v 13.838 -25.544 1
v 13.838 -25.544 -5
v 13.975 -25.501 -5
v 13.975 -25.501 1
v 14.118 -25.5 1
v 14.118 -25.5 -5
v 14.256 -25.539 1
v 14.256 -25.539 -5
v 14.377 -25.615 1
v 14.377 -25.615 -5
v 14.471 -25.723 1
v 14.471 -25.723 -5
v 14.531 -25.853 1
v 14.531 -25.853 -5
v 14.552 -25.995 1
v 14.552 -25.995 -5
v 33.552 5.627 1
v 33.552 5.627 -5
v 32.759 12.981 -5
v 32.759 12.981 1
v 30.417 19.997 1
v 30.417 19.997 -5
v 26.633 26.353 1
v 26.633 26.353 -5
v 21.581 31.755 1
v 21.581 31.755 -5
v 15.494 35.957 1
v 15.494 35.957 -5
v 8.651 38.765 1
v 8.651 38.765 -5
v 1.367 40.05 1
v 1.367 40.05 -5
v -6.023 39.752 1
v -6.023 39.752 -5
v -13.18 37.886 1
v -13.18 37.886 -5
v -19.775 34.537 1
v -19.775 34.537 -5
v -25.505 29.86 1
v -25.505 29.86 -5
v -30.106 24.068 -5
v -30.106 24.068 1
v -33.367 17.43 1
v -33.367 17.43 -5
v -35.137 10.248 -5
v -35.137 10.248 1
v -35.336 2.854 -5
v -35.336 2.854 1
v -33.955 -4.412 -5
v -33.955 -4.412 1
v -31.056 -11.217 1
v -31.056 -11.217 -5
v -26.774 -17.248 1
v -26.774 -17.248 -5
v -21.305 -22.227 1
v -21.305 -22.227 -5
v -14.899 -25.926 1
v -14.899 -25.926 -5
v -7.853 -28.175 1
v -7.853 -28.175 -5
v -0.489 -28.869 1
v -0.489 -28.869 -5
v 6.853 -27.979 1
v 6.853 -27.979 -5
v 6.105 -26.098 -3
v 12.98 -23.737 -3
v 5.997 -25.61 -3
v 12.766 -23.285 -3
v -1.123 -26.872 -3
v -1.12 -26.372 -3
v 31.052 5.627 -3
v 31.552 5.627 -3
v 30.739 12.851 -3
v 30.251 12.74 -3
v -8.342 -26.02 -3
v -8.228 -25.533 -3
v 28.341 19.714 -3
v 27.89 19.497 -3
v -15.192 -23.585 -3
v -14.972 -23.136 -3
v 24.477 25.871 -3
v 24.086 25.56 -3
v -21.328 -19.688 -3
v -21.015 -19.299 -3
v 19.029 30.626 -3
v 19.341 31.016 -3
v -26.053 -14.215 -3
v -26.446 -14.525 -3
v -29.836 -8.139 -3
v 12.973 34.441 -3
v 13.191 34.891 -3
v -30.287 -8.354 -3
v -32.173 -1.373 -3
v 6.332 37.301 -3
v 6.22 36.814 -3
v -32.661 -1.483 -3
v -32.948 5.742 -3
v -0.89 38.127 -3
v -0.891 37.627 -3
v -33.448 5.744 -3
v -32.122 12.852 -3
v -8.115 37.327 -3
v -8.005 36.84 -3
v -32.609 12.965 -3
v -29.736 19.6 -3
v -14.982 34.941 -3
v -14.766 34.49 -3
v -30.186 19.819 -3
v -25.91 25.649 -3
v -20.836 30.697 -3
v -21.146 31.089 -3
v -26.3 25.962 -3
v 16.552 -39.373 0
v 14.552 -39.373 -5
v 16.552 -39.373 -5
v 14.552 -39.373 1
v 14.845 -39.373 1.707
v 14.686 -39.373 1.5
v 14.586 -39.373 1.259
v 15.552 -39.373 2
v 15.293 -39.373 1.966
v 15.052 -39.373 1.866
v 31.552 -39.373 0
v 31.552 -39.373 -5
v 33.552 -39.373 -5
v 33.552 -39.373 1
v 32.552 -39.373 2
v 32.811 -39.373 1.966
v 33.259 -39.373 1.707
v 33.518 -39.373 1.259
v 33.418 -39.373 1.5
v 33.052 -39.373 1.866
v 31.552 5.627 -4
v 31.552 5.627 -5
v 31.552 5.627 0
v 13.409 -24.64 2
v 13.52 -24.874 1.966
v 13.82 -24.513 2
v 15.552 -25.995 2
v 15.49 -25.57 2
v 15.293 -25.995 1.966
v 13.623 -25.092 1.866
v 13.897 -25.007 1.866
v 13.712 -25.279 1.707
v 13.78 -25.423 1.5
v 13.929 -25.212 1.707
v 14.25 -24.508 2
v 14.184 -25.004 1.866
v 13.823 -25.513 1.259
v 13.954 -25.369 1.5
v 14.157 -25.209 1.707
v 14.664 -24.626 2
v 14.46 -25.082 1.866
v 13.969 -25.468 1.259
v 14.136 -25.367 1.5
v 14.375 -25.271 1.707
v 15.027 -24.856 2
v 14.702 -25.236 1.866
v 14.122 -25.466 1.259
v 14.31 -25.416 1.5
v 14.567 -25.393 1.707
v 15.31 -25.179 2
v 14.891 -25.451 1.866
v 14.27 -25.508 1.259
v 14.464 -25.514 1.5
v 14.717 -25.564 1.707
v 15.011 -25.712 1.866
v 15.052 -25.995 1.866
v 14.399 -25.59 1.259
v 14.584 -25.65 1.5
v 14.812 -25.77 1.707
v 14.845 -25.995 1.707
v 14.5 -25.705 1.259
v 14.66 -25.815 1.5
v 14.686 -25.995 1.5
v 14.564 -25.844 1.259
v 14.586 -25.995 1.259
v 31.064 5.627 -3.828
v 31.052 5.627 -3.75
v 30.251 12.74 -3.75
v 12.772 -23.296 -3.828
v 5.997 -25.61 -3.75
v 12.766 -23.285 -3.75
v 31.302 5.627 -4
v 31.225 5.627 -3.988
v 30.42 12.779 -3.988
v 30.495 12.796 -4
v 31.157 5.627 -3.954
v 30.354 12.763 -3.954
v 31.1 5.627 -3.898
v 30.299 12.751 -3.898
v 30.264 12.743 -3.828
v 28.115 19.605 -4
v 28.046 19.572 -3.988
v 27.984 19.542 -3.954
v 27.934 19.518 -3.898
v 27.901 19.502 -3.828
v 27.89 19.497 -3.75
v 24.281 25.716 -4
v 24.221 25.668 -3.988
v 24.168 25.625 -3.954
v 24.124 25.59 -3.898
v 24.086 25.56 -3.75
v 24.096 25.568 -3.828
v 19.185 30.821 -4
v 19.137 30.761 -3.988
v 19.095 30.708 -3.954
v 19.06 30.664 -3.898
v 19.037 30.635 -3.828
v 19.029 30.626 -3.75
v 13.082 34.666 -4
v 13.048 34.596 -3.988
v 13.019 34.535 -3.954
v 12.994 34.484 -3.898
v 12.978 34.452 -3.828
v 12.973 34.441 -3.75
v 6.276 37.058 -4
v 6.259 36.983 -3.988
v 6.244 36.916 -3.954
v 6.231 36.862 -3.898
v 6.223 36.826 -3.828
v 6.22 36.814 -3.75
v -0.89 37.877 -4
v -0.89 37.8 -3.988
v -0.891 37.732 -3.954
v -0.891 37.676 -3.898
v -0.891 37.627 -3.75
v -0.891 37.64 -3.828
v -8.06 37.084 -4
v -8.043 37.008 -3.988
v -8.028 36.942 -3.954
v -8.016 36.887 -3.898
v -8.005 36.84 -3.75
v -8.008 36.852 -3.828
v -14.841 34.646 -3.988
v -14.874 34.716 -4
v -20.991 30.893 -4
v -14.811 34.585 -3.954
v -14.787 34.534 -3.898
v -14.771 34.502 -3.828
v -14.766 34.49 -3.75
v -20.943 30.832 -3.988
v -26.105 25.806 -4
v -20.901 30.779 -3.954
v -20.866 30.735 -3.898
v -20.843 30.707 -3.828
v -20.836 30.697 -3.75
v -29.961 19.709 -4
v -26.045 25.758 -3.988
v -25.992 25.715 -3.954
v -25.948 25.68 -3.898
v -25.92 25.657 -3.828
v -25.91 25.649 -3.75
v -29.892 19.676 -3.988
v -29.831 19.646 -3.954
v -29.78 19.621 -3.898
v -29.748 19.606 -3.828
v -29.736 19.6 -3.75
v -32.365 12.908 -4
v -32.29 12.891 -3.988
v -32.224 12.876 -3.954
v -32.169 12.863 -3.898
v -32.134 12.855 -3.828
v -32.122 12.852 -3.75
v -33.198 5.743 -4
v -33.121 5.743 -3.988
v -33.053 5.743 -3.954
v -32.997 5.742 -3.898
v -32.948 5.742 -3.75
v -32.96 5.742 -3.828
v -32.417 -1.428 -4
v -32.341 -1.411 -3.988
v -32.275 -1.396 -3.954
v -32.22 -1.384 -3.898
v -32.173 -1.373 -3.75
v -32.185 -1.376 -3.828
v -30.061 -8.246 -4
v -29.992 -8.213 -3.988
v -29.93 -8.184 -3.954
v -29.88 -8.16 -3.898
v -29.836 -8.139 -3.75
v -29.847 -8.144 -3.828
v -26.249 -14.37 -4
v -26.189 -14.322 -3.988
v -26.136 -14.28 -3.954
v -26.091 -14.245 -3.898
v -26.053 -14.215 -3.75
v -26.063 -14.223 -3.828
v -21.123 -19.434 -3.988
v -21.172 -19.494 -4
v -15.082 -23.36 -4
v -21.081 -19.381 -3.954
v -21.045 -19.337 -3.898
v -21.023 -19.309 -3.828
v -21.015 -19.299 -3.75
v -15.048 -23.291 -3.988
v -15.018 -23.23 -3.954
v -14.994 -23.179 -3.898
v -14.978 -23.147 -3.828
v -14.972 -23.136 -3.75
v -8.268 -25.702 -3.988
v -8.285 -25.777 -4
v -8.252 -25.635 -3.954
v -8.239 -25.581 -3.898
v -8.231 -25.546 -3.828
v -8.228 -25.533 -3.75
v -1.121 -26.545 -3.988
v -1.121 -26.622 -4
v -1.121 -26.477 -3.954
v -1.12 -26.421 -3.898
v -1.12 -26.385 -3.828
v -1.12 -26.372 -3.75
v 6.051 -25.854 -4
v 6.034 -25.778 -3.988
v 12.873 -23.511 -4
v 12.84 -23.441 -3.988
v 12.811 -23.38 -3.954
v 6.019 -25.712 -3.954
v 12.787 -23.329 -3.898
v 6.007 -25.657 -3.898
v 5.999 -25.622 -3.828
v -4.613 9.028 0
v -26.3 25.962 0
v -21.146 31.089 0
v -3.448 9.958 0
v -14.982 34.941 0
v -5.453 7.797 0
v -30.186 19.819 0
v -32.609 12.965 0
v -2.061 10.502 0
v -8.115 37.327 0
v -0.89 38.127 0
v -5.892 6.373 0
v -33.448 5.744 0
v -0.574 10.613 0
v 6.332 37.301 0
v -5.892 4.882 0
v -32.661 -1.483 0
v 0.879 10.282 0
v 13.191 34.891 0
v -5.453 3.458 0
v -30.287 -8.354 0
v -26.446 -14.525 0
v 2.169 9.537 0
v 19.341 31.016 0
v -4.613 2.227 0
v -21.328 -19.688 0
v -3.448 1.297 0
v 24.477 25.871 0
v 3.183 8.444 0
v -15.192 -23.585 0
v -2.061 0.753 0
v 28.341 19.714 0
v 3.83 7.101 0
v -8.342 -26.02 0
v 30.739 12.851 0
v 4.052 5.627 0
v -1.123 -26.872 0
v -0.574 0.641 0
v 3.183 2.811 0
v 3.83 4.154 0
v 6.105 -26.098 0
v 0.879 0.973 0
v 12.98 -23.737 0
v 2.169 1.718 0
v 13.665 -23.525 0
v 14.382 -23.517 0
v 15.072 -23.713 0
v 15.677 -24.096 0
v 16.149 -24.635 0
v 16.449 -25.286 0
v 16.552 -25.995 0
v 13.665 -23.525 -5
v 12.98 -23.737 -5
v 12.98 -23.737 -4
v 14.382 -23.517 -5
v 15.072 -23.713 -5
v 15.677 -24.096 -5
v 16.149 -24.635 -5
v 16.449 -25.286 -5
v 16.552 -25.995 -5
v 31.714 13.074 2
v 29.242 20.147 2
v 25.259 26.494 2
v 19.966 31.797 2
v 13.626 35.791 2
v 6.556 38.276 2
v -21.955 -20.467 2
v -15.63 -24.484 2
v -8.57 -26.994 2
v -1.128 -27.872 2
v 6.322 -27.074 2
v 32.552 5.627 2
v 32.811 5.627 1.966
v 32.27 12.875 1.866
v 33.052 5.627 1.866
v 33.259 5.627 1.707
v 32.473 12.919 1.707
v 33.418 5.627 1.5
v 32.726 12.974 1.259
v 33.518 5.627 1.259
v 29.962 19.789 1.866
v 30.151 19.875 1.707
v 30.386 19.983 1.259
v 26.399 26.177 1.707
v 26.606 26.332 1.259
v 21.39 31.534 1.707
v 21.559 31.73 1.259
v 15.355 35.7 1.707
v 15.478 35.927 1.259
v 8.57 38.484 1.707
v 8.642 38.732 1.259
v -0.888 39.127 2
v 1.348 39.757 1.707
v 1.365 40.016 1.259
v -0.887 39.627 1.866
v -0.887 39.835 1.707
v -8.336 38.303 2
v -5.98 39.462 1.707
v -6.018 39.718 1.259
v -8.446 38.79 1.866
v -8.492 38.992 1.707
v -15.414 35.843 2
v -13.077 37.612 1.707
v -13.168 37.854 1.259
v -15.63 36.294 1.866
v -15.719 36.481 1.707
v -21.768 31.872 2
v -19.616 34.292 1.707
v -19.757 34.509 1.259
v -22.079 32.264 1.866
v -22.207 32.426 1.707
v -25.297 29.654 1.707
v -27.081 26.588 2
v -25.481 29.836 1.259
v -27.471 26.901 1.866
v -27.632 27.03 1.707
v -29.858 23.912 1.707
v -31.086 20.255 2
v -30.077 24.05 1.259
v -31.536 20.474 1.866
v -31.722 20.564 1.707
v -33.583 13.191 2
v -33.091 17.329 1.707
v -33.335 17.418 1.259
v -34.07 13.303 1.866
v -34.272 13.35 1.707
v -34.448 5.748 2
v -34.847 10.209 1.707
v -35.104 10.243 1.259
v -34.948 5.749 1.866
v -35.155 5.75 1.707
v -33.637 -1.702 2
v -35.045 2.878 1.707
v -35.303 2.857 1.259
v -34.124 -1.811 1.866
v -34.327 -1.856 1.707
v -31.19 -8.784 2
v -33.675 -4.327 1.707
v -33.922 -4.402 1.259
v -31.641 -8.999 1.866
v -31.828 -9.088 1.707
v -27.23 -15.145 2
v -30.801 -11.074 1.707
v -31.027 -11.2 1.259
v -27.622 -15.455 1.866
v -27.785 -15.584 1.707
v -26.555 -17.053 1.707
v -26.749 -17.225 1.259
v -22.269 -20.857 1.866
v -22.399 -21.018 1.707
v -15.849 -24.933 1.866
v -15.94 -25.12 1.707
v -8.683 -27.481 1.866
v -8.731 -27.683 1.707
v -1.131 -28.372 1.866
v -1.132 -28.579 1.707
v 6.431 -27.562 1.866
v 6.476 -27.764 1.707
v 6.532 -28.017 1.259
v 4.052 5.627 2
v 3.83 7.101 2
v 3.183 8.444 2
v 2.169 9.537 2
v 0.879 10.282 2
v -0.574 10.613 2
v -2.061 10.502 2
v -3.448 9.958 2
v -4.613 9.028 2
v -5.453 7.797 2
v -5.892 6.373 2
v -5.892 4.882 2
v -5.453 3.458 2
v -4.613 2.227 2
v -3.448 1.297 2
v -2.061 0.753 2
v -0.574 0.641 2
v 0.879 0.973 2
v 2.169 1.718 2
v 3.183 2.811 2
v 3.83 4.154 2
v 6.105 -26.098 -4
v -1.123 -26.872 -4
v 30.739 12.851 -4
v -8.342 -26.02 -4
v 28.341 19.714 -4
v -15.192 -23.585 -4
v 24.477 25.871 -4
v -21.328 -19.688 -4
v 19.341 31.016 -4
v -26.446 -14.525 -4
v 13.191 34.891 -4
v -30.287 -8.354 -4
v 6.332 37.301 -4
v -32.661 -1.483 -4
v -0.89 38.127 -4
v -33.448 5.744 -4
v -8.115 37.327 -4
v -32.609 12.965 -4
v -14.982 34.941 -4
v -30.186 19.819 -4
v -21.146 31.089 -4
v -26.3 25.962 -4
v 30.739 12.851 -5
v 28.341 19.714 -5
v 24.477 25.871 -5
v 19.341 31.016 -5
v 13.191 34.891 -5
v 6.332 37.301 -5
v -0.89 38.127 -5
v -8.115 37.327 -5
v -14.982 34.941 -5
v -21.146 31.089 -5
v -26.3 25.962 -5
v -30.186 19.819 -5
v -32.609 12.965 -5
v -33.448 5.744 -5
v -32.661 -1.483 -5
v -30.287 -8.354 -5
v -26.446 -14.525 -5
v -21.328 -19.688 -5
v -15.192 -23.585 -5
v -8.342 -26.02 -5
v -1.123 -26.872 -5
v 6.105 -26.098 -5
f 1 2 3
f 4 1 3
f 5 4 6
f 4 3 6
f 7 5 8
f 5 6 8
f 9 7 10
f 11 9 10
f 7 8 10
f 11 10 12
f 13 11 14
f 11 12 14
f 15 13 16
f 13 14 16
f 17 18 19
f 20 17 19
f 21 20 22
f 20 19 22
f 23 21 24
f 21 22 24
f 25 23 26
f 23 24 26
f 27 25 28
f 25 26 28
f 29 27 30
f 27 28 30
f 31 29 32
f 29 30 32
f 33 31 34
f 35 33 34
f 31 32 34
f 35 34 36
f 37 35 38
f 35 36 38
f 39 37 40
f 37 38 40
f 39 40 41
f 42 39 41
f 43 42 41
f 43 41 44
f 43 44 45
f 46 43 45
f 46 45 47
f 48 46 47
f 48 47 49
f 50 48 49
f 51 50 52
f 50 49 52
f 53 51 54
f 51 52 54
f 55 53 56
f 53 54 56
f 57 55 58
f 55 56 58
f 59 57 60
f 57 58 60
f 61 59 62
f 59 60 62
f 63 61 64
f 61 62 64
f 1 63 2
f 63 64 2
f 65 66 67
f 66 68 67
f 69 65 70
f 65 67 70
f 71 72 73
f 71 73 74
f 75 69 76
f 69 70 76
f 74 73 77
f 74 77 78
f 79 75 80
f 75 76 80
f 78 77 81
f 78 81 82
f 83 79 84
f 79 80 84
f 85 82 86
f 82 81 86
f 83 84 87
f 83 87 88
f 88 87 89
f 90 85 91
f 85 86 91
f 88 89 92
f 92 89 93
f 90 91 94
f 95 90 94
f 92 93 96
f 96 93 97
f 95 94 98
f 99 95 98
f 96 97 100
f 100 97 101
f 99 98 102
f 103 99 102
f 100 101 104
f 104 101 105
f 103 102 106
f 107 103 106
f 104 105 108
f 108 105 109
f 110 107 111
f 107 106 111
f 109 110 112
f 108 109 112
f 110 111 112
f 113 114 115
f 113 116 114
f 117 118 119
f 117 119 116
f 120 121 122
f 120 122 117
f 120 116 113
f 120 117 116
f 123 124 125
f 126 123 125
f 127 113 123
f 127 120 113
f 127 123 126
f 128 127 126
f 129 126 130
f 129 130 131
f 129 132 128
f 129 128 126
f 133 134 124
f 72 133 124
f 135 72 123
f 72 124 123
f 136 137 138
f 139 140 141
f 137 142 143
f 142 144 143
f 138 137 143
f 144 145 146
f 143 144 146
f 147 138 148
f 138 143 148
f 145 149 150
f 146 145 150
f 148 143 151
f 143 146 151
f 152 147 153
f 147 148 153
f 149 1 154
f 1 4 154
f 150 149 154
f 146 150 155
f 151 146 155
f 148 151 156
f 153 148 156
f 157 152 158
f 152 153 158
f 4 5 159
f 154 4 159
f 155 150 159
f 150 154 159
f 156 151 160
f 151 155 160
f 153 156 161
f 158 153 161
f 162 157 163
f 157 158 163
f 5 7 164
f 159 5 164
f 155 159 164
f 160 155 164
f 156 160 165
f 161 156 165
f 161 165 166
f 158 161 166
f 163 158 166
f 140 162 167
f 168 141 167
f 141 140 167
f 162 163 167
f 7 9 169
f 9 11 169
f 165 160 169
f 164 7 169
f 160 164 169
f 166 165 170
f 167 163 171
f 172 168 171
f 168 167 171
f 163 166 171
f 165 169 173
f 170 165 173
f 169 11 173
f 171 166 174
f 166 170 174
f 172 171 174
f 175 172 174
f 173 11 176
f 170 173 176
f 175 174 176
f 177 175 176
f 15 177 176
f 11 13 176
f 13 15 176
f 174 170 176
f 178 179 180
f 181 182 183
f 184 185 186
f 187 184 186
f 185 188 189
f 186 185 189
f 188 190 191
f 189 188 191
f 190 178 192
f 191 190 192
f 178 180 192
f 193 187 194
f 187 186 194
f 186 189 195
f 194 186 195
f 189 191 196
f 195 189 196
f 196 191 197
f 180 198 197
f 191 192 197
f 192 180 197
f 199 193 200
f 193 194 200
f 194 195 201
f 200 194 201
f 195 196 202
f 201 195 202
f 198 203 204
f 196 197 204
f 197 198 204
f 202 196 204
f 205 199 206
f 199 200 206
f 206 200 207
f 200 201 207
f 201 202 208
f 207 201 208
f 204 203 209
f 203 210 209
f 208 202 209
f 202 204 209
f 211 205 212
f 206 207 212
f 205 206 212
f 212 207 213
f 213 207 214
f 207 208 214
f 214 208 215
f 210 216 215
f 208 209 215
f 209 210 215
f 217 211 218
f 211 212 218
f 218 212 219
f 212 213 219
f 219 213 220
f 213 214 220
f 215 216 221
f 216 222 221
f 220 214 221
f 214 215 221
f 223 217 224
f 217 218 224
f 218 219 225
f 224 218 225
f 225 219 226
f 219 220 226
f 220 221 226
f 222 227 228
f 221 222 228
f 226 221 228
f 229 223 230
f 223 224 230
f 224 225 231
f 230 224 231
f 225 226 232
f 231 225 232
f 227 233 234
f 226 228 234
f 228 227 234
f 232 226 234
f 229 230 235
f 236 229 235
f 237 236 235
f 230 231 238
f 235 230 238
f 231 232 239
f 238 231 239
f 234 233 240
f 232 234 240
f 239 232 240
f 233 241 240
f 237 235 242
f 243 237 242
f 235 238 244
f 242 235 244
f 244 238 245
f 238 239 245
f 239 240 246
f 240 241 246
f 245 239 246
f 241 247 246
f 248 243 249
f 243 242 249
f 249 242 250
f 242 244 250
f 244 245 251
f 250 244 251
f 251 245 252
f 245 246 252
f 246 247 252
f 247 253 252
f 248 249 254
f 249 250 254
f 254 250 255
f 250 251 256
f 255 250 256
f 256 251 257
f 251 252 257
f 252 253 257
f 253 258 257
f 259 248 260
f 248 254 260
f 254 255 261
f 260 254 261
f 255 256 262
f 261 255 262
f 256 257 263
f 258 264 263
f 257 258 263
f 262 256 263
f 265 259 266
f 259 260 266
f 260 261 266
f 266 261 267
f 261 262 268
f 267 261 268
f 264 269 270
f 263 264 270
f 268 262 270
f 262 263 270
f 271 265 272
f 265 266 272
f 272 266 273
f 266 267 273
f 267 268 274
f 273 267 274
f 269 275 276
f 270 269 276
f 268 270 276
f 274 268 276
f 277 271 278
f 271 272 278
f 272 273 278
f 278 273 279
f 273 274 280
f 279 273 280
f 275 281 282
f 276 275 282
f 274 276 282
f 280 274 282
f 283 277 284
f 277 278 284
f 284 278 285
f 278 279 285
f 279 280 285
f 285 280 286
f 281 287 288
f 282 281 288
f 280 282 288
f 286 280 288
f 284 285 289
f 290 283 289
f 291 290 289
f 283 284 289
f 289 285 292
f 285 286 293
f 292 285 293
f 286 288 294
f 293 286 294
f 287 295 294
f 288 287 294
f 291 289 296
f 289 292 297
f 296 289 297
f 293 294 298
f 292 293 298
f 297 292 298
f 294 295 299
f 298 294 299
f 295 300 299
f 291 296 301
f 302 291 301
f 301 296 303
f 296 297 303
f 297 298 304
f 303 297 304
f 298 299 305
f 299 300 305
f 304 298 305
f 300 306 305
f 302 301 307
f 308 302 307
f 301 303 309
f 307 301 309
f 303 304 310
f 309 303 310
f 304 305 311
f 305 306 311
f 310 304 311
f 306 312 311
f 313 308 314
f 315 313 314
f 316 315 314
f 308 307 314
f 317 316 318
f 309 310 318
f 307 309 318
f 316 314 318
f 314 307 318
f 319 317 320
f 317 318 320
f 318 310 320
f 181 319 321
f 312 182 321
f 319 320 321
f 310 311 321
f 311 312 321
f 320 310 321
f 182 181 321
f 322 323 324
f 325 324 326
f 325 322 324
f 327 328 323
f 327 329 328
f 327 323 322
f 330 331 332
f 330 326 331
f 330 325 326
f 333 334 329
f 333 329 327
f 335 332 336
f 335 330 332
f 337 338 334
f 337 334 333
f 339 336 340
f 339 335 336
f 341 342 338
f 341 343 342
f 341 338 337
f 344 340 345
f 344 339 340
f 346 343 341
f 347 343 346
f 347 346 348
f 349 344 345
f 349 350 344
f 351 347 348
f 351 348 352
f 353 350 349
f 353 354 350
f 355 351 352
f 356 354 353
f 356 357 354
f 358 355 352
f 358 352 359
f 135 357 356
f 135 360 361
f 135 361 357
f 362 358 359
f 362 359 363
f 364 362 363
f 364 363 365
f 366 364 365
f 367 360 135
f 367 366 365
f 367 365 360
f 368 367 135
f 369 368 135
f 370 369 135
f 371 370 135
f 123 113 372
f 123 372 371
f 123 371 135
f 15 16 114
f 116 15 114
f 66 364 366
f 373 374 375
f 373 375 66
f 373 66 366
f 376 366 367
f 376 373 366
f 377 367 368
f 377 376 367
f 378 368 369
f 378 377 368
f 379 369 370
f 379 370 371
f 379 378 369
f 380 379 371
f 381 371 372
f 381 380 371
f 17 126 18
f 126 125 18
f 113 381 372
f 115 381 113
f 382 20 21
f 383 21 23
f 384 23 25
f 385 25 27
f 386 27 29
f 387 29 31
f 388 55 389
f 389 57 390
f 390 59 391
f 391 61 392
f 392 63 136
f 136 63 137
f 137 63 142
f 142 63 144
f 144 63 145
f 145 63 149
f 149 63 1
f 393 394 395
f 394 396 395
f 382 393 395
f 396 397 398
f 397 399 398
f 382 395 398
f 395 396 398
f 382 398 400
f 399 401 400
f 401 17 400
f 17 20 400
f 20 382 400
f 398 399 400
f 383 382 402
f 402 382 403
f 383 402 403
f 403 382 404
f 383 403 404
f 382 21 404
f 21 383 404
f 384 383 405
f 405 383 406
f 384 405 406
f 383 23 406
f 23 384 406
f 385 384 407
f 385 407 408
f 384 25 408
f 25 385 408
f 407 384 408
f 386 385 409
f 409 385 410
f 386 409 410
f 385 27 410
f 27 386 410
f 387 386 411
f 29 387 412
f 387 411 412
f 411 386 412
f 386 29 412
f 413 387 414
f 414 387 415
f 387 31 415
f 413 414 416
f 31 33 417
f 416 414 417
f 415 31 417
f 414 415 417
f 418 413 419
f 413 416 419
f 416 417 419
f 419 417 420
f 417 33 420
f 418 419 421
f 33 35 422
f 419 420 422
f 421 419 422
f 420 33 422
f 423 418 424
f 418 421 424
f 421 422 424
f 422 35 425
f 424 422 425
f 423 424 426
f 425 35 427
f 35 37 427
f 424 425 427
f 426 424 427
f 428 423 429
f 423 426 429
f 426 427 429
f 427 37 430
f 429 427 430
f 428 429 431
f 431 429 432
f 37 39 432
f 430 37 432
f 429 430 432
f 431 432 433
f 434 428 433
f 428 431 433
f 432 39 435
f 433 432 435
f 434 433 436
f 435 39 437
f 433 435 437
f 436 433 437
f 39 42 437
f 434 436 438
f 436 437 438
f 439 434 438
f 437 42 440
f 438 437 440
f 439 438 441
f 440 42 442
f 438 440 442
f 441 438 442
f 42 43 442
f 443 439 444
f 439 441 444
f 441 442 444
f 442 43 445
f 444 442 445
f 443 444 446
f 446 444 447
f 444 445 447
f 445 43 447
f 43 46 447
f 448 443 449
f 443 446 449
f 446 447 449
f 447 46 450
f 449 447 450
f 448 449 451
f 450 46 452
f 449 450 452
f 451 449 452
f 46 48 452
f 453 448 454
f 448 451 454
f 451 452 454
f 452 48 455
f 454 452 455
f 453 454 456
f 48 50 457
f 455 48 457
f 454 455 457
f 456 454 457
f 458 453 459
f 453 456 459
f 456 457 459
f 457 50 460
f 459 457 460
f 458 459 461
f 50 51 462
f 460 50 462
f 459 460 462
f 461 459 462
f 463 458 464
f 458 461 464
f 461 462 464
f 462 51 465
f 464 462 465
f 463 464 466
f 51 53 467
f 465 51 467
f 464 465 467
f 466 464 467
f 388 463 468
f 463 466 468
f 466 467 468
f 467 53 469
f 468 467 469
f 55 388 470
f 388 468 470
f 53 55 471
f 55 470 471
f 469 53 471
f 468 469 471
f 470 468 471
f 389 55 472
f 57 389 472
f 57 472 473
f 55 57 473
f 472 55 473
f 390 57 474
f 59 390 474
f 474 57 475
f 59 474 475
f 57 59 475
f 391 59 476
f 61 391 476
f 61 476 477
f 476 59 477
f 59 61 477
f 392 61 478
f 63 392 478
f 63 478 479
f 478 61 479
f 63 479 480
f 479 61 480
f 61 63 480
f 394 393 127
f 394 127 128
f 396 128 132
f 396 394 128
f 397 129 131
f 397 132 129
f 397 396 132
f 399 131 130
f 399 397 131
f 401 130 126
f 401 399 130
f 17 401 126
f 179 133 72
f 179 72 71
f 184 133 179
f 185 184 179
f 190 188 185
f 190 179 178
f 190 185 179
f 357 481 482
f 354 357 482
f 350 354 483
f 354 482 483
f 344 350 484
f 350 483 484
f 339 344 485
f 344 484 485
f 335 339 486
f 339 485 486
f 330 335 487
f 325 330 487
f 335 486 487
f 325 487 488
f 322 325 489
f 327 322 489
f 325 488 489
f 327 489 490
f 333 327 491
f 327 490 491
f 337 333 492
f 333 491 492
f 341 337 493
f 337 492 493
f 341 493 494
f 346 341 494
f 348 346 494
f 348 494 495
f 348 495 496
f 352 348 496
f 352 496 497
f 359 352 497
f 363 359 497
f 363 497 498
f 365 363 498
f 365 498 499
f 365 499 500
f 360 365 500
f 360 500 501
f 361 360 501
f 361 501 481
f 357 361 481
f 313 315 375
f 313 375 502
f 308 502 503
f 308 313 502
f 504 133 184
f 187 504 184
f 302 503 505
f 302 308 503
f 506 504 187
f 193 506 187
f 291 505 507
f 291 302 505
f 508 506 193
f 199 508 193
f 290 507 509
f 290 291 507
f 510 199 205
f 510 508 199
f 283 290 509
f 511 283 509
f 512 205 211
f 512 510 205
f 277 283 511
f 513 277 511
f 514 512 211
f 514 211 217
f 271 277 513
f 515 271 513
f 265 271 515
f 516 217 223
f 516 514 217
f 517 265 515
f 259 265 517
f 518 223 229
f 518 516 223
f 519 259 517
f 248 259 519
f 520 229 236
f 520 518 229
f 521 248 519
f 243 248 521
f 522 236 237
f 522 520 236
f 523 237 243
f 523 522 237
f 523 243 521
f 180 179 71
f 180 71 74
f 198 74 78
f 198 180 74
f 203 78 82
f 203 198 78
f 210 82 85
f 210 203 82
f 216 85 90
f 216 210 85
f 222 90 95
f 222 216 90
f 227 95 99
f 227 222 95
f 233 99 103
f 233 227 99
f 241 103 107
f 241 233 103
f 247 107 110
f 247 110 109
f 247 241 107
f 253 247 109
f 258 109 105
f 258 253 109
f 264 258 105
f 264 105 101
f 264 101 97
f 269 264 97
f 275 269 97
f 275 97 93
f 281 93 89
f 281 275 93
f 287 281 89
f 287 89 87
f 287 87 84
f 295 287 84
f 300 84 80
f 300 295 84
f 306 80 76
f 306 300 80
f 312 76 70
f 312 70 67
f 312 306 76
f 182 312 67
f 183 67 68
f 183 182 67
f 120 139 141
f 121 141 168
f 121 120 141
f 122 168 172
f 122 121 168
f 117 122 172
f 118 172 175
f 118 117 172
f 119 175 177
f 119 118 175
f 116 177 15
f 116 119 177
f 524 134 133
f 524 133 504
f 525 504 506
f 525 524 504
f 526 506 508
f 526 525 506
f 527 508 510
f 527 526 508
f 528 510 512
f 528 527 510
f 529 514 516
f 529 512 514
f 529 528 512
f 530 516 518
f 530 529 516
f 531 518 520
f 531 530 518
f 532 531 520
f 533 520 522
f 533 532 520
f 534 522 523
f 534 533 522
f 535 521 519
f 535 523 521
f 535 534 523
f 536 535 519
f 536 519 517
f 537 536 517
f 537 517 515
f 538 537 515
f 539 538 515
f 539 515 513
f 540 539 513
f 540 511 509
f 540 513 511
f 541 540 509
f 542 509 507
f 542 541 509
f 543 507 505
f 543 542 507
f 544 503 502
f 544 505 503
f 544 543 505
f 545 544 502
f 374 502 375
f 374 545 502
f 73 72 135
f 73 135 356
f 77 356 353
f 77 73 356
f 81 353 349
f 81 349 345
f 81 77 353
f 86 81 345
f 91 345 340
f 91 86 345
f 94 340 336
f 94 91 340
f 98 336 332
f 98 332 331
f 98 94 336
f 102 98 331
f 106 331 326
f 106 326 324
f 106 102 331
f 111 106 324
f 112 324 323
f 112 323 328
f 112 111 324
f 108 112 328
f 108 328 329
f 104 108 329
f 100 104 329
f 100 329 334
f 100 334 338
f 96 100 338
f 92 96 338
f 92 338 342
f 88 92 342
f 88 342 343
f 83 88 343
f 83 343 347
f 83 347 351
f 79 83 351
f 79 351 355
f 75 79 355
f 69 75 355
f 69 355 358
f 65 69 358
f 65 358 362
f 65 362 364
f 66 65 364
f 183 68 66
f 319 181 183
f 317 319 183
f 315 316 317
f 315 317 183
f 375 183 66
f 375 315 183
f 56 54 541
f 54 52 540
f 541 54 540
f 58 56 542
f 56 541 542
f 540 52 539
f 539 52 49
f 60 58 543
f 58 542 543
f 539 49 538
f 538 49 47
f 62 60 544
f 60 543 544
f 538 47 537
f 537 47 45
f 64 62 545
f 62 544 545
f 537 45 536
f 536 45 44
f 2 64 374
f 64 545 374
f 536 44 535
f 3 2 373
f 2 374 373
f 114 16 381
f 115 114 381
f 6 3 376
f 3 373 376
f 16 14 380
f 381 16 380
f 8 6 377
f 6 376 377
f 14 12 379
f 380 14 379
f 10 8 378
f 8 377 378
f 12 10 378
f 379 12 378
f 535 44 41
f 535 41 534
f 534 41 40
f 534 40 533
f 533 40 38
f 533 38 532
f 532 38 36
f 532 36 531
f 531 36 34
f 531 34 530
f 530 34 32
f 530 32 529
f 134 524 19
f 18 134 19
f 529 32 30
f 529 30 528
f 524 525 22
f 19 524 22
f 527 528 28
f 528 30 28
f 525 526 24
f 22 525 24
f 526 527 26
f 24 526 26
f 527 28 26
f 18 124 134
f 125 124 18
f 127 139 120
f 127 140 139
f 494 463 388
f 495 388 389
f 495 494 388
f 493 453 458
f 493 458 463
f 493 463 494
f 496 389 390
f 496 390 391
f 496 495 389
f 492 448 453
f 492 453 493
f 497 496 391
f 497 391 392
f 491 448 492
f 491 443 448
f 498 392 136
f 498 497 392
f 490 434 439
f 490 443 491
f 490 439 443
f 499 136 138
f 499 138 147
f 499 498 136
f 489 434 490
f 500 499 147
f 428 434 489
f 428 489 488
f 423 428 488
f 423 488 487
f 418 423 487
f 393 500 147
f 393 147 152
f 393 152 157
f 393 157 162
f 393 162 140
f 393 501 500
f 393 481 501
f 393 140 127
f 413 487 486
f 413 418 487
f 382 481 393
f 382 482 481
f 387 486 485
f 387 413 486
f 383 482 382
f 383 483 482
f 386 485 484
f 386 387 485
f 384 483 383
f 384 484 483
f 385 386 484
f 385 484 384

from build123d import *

# Parameters (mm, degrees)
BOSS_EXTRU_1_DEPTH      = 2
BOSS_EXTRU_2_START      = -7
BOSS_EXTRU_2_DEPTH      = 5
BOSS_EXTRU_3_START      = -1
BOSS_EXTRU_3_DEPTH      = 1
CONG_1_R                = 0.25
BOSS_EXTRU_4_DEPTH      = 2
CONG_4_R                = 1
ESQUISSE5_R             = 5
ENL_V_MAT_EXTRU_1_DEPTH = 55.929567647
ESQUISSE6_W             = 15
ESQUISSE6_H             = 5
ENL_V_MAT_EXTRU_2_DEPTH = 2
ENL_V_MAT_EXTRU_3_DEPTH = 2


with BuildPart() as part:
    # Esquisse1 → Boss.-Extru.1 (new body)
    with BuildSketch(Plane.XY):
        with BuildLine():
            Line((31.551874669, -39.37254902), (31.551874669, 5.62745098))
            ThreePointArc((31.551874669, 5.62745098), (-28.41563861, 22.999431705), (12.980446097, -23.736555864))
            ThreePointArc((12.980446097, -23.736555864), (15.388180878, -23.882439984), (16.551874669, -25.995325621))
            Line((16.551874669, -25.995325621), (16.551874669, -39.37254902))
            Line((16.551874669, -39.37254902), (31.551874669, -39.37254902))
        make_face()
    extrude(amount=BOSS_EXTRU_1_DEPTH)



with BuildPart() as body_2:
    # Esquisse2 → Boss.-Extru.2 (new body)
    with BuildSketch(Plane.XY.offset(2).offset(BOSS_EXTRU_2_START)):
        with BuildLine():
            Line((14.551874669, -41.37254902), (33.551874669, -41.37254902))
            Line((33.551874669, -41.37254902), (33.551874669, 5.62745098))
            ThreePointArc((33.551874669, 5.62745098), (-30.105947119, 24.068476672), (13.837588955, -25.54357167))
            ThreePointArc((13.837588955, -25.54357167), (14.319135911, -25.572748494), (14.551874669, -25.995325621))
            Line((14.551874669, -25.995325621), (14.551874669, -41.37254902))
        make_face()
        with BuildLine():
            Line((16.551874669, -39.37254902), (31.551874669, -39.37254902))
            Line((31.551874669, -39.37254902), (31.551874669, 5.62745098))
            ThreePointArc((31.551874669, 5.62745098), (-28.41563861, 22.999431705), (12.980446097, -23.736555864))
            ThreePointArc((12.980446097, -23.736555864), (15.388180878, -23.882439984), (16.551874669, -25.995325621))
            Line((16.551874669, -25.995325621), (16.551874669, -39.37254902))
        make_face(mode=Mode.SUBTRACT)
    extrude(amount=BOSS_EXTRU_2_DEPTH)

    # Esquisse3 → Boss.-Extru.3 (add)
    with BuildSketch(Plane(origin=(0, 0, -5), x_dir=(-1, 0, 0), z_dir=(0, 0, -1)).offset(BOSS_EXTRU_3_START)):
        with BuildLine():
            ThreePointArc((-12.980446097, -23.736555864), (28.41563861, 22.999431705), (-31.551874669, 5.62745098))
            Line((-31.551874669, 5.62745098), (-31.051874669, 5.62745098))
            ThreePointArc((-31.051874669, 5.62745098), (27.993061483, 22.732170463), (-12.766160383, -23.284801913))
            Line((-12.766160383, -23.284801913), (-12.980446097, -23.736555864))
        make_face()
    extrude(amount=-BOSS_EXTRU_3_DEPTH)

    # Congé1
    cong_1_edges = [body_2.edges().sort_by_distance(p)[0] for p in [
        (-27.993061483, 22.732170463, -4),
    ]]
    fillet(cong_1_edges, radius=CONG_1_R)


with BuildPart() as part_1:
    add(part.part)

    add(body_2.part)  # Boss.-Extru.4 merges body 2
    # Esquisse4 → Boss.-Extru.4 (add)
    with BuildSketch(Plane.XY):
        with BuildLine():
            Line((14.551874669, -25.995325621), (14.551874669, -41.37254902))
            Line((14.551874669, -41.37254902), (33.551874669, -41.37254902))
            Line((33.551874669, -41.37254902), (33.551874669, 5.62745098))
            ThreePointArc((33.551874669, 5.62745098), (-30.105947119, 24.068476672), (13.837588955, -25.54357167))
            ThreePointArc((13.837588955, -25.54357167), (14.319135911, -25.572748494), (14.551874669, -25.995325621))
        make_face()
    extrude(amount=BOSS_EXTRU_4_DEPTH)

    # Congé4
    cong_4_edges = [part_1.edges().sort_by_distance(p)[0] for p in [
        (14.319135911, -25.572748494, 2),
        (14.551874669, -33.68393732, 2),
        (33.551874669, -17.87254902, 2),
        (-30.105947119, 24.068476672, 2),
    ]]
    fillet(cong_4_edges, radius=CONG_4_R)

    # Esquisse5 → Enlèv. mat.-Extru.1 (cut, through all)
    with BuildSketch(Plane.XY.offset(2)):
        with Locations((-0.948125331, 5.62745098)):
            Circle(ESQUISSE5_R)
    extrude(amount=-ENL_V_MAT_EXTRU_1_DEPTH, mode=Mode.SUBTRACT)

    # Esquisse6 → Enlèv. mat.-Extru.2 (cut)
    with BuildSketch(Plane.XZ.offset(41.37254902)):
        with Locations((24.051874669, -2.5)):
            Rectangle(ESQUISSE6_W, ESQUISSE6_H)
    extrude(amount=-ENL_V_MAT_EXTRU_2_DEPTH, mode=Mode.SUBTRACT)

    # Esquisse7 → Enlèv. mat.-Extru.3 (cut)
    with BuildSketch(Plane.XZ.offset(41.37254902)):
        with BuildLine():
            Line((14.551874669, -5), (16.551874669, -5))
            Line((16.551874669, -5), (16.551874669, 0))
            Line((16.551874669, 0), (31.551874669, 0))
            Line((31.551874669, 0), (31.551874669, -5))
            Line((31.551874669, -5), (33.551874669, -5))
            Line((33.551874669, -5), (33.551874669, 1))
            ThreePointArc((33.551874669, 1), (33.25898145, 1.707106781), (32.551874669, 2))
            Line((32.551874669, 2), (15.551874669, 2))
            ThreePointArc((15.551874669, 2), (14.844767888, 1.707106781), (14.551874669, 1))
            Line((14.551874669, 1), (14.551874669, -5))
        make_face()
    extrude(amount=-ENL_V_MAT_EXTRU_3_DEPTH, mode=Mode.SUBTRACT)


solid = part_1.part
